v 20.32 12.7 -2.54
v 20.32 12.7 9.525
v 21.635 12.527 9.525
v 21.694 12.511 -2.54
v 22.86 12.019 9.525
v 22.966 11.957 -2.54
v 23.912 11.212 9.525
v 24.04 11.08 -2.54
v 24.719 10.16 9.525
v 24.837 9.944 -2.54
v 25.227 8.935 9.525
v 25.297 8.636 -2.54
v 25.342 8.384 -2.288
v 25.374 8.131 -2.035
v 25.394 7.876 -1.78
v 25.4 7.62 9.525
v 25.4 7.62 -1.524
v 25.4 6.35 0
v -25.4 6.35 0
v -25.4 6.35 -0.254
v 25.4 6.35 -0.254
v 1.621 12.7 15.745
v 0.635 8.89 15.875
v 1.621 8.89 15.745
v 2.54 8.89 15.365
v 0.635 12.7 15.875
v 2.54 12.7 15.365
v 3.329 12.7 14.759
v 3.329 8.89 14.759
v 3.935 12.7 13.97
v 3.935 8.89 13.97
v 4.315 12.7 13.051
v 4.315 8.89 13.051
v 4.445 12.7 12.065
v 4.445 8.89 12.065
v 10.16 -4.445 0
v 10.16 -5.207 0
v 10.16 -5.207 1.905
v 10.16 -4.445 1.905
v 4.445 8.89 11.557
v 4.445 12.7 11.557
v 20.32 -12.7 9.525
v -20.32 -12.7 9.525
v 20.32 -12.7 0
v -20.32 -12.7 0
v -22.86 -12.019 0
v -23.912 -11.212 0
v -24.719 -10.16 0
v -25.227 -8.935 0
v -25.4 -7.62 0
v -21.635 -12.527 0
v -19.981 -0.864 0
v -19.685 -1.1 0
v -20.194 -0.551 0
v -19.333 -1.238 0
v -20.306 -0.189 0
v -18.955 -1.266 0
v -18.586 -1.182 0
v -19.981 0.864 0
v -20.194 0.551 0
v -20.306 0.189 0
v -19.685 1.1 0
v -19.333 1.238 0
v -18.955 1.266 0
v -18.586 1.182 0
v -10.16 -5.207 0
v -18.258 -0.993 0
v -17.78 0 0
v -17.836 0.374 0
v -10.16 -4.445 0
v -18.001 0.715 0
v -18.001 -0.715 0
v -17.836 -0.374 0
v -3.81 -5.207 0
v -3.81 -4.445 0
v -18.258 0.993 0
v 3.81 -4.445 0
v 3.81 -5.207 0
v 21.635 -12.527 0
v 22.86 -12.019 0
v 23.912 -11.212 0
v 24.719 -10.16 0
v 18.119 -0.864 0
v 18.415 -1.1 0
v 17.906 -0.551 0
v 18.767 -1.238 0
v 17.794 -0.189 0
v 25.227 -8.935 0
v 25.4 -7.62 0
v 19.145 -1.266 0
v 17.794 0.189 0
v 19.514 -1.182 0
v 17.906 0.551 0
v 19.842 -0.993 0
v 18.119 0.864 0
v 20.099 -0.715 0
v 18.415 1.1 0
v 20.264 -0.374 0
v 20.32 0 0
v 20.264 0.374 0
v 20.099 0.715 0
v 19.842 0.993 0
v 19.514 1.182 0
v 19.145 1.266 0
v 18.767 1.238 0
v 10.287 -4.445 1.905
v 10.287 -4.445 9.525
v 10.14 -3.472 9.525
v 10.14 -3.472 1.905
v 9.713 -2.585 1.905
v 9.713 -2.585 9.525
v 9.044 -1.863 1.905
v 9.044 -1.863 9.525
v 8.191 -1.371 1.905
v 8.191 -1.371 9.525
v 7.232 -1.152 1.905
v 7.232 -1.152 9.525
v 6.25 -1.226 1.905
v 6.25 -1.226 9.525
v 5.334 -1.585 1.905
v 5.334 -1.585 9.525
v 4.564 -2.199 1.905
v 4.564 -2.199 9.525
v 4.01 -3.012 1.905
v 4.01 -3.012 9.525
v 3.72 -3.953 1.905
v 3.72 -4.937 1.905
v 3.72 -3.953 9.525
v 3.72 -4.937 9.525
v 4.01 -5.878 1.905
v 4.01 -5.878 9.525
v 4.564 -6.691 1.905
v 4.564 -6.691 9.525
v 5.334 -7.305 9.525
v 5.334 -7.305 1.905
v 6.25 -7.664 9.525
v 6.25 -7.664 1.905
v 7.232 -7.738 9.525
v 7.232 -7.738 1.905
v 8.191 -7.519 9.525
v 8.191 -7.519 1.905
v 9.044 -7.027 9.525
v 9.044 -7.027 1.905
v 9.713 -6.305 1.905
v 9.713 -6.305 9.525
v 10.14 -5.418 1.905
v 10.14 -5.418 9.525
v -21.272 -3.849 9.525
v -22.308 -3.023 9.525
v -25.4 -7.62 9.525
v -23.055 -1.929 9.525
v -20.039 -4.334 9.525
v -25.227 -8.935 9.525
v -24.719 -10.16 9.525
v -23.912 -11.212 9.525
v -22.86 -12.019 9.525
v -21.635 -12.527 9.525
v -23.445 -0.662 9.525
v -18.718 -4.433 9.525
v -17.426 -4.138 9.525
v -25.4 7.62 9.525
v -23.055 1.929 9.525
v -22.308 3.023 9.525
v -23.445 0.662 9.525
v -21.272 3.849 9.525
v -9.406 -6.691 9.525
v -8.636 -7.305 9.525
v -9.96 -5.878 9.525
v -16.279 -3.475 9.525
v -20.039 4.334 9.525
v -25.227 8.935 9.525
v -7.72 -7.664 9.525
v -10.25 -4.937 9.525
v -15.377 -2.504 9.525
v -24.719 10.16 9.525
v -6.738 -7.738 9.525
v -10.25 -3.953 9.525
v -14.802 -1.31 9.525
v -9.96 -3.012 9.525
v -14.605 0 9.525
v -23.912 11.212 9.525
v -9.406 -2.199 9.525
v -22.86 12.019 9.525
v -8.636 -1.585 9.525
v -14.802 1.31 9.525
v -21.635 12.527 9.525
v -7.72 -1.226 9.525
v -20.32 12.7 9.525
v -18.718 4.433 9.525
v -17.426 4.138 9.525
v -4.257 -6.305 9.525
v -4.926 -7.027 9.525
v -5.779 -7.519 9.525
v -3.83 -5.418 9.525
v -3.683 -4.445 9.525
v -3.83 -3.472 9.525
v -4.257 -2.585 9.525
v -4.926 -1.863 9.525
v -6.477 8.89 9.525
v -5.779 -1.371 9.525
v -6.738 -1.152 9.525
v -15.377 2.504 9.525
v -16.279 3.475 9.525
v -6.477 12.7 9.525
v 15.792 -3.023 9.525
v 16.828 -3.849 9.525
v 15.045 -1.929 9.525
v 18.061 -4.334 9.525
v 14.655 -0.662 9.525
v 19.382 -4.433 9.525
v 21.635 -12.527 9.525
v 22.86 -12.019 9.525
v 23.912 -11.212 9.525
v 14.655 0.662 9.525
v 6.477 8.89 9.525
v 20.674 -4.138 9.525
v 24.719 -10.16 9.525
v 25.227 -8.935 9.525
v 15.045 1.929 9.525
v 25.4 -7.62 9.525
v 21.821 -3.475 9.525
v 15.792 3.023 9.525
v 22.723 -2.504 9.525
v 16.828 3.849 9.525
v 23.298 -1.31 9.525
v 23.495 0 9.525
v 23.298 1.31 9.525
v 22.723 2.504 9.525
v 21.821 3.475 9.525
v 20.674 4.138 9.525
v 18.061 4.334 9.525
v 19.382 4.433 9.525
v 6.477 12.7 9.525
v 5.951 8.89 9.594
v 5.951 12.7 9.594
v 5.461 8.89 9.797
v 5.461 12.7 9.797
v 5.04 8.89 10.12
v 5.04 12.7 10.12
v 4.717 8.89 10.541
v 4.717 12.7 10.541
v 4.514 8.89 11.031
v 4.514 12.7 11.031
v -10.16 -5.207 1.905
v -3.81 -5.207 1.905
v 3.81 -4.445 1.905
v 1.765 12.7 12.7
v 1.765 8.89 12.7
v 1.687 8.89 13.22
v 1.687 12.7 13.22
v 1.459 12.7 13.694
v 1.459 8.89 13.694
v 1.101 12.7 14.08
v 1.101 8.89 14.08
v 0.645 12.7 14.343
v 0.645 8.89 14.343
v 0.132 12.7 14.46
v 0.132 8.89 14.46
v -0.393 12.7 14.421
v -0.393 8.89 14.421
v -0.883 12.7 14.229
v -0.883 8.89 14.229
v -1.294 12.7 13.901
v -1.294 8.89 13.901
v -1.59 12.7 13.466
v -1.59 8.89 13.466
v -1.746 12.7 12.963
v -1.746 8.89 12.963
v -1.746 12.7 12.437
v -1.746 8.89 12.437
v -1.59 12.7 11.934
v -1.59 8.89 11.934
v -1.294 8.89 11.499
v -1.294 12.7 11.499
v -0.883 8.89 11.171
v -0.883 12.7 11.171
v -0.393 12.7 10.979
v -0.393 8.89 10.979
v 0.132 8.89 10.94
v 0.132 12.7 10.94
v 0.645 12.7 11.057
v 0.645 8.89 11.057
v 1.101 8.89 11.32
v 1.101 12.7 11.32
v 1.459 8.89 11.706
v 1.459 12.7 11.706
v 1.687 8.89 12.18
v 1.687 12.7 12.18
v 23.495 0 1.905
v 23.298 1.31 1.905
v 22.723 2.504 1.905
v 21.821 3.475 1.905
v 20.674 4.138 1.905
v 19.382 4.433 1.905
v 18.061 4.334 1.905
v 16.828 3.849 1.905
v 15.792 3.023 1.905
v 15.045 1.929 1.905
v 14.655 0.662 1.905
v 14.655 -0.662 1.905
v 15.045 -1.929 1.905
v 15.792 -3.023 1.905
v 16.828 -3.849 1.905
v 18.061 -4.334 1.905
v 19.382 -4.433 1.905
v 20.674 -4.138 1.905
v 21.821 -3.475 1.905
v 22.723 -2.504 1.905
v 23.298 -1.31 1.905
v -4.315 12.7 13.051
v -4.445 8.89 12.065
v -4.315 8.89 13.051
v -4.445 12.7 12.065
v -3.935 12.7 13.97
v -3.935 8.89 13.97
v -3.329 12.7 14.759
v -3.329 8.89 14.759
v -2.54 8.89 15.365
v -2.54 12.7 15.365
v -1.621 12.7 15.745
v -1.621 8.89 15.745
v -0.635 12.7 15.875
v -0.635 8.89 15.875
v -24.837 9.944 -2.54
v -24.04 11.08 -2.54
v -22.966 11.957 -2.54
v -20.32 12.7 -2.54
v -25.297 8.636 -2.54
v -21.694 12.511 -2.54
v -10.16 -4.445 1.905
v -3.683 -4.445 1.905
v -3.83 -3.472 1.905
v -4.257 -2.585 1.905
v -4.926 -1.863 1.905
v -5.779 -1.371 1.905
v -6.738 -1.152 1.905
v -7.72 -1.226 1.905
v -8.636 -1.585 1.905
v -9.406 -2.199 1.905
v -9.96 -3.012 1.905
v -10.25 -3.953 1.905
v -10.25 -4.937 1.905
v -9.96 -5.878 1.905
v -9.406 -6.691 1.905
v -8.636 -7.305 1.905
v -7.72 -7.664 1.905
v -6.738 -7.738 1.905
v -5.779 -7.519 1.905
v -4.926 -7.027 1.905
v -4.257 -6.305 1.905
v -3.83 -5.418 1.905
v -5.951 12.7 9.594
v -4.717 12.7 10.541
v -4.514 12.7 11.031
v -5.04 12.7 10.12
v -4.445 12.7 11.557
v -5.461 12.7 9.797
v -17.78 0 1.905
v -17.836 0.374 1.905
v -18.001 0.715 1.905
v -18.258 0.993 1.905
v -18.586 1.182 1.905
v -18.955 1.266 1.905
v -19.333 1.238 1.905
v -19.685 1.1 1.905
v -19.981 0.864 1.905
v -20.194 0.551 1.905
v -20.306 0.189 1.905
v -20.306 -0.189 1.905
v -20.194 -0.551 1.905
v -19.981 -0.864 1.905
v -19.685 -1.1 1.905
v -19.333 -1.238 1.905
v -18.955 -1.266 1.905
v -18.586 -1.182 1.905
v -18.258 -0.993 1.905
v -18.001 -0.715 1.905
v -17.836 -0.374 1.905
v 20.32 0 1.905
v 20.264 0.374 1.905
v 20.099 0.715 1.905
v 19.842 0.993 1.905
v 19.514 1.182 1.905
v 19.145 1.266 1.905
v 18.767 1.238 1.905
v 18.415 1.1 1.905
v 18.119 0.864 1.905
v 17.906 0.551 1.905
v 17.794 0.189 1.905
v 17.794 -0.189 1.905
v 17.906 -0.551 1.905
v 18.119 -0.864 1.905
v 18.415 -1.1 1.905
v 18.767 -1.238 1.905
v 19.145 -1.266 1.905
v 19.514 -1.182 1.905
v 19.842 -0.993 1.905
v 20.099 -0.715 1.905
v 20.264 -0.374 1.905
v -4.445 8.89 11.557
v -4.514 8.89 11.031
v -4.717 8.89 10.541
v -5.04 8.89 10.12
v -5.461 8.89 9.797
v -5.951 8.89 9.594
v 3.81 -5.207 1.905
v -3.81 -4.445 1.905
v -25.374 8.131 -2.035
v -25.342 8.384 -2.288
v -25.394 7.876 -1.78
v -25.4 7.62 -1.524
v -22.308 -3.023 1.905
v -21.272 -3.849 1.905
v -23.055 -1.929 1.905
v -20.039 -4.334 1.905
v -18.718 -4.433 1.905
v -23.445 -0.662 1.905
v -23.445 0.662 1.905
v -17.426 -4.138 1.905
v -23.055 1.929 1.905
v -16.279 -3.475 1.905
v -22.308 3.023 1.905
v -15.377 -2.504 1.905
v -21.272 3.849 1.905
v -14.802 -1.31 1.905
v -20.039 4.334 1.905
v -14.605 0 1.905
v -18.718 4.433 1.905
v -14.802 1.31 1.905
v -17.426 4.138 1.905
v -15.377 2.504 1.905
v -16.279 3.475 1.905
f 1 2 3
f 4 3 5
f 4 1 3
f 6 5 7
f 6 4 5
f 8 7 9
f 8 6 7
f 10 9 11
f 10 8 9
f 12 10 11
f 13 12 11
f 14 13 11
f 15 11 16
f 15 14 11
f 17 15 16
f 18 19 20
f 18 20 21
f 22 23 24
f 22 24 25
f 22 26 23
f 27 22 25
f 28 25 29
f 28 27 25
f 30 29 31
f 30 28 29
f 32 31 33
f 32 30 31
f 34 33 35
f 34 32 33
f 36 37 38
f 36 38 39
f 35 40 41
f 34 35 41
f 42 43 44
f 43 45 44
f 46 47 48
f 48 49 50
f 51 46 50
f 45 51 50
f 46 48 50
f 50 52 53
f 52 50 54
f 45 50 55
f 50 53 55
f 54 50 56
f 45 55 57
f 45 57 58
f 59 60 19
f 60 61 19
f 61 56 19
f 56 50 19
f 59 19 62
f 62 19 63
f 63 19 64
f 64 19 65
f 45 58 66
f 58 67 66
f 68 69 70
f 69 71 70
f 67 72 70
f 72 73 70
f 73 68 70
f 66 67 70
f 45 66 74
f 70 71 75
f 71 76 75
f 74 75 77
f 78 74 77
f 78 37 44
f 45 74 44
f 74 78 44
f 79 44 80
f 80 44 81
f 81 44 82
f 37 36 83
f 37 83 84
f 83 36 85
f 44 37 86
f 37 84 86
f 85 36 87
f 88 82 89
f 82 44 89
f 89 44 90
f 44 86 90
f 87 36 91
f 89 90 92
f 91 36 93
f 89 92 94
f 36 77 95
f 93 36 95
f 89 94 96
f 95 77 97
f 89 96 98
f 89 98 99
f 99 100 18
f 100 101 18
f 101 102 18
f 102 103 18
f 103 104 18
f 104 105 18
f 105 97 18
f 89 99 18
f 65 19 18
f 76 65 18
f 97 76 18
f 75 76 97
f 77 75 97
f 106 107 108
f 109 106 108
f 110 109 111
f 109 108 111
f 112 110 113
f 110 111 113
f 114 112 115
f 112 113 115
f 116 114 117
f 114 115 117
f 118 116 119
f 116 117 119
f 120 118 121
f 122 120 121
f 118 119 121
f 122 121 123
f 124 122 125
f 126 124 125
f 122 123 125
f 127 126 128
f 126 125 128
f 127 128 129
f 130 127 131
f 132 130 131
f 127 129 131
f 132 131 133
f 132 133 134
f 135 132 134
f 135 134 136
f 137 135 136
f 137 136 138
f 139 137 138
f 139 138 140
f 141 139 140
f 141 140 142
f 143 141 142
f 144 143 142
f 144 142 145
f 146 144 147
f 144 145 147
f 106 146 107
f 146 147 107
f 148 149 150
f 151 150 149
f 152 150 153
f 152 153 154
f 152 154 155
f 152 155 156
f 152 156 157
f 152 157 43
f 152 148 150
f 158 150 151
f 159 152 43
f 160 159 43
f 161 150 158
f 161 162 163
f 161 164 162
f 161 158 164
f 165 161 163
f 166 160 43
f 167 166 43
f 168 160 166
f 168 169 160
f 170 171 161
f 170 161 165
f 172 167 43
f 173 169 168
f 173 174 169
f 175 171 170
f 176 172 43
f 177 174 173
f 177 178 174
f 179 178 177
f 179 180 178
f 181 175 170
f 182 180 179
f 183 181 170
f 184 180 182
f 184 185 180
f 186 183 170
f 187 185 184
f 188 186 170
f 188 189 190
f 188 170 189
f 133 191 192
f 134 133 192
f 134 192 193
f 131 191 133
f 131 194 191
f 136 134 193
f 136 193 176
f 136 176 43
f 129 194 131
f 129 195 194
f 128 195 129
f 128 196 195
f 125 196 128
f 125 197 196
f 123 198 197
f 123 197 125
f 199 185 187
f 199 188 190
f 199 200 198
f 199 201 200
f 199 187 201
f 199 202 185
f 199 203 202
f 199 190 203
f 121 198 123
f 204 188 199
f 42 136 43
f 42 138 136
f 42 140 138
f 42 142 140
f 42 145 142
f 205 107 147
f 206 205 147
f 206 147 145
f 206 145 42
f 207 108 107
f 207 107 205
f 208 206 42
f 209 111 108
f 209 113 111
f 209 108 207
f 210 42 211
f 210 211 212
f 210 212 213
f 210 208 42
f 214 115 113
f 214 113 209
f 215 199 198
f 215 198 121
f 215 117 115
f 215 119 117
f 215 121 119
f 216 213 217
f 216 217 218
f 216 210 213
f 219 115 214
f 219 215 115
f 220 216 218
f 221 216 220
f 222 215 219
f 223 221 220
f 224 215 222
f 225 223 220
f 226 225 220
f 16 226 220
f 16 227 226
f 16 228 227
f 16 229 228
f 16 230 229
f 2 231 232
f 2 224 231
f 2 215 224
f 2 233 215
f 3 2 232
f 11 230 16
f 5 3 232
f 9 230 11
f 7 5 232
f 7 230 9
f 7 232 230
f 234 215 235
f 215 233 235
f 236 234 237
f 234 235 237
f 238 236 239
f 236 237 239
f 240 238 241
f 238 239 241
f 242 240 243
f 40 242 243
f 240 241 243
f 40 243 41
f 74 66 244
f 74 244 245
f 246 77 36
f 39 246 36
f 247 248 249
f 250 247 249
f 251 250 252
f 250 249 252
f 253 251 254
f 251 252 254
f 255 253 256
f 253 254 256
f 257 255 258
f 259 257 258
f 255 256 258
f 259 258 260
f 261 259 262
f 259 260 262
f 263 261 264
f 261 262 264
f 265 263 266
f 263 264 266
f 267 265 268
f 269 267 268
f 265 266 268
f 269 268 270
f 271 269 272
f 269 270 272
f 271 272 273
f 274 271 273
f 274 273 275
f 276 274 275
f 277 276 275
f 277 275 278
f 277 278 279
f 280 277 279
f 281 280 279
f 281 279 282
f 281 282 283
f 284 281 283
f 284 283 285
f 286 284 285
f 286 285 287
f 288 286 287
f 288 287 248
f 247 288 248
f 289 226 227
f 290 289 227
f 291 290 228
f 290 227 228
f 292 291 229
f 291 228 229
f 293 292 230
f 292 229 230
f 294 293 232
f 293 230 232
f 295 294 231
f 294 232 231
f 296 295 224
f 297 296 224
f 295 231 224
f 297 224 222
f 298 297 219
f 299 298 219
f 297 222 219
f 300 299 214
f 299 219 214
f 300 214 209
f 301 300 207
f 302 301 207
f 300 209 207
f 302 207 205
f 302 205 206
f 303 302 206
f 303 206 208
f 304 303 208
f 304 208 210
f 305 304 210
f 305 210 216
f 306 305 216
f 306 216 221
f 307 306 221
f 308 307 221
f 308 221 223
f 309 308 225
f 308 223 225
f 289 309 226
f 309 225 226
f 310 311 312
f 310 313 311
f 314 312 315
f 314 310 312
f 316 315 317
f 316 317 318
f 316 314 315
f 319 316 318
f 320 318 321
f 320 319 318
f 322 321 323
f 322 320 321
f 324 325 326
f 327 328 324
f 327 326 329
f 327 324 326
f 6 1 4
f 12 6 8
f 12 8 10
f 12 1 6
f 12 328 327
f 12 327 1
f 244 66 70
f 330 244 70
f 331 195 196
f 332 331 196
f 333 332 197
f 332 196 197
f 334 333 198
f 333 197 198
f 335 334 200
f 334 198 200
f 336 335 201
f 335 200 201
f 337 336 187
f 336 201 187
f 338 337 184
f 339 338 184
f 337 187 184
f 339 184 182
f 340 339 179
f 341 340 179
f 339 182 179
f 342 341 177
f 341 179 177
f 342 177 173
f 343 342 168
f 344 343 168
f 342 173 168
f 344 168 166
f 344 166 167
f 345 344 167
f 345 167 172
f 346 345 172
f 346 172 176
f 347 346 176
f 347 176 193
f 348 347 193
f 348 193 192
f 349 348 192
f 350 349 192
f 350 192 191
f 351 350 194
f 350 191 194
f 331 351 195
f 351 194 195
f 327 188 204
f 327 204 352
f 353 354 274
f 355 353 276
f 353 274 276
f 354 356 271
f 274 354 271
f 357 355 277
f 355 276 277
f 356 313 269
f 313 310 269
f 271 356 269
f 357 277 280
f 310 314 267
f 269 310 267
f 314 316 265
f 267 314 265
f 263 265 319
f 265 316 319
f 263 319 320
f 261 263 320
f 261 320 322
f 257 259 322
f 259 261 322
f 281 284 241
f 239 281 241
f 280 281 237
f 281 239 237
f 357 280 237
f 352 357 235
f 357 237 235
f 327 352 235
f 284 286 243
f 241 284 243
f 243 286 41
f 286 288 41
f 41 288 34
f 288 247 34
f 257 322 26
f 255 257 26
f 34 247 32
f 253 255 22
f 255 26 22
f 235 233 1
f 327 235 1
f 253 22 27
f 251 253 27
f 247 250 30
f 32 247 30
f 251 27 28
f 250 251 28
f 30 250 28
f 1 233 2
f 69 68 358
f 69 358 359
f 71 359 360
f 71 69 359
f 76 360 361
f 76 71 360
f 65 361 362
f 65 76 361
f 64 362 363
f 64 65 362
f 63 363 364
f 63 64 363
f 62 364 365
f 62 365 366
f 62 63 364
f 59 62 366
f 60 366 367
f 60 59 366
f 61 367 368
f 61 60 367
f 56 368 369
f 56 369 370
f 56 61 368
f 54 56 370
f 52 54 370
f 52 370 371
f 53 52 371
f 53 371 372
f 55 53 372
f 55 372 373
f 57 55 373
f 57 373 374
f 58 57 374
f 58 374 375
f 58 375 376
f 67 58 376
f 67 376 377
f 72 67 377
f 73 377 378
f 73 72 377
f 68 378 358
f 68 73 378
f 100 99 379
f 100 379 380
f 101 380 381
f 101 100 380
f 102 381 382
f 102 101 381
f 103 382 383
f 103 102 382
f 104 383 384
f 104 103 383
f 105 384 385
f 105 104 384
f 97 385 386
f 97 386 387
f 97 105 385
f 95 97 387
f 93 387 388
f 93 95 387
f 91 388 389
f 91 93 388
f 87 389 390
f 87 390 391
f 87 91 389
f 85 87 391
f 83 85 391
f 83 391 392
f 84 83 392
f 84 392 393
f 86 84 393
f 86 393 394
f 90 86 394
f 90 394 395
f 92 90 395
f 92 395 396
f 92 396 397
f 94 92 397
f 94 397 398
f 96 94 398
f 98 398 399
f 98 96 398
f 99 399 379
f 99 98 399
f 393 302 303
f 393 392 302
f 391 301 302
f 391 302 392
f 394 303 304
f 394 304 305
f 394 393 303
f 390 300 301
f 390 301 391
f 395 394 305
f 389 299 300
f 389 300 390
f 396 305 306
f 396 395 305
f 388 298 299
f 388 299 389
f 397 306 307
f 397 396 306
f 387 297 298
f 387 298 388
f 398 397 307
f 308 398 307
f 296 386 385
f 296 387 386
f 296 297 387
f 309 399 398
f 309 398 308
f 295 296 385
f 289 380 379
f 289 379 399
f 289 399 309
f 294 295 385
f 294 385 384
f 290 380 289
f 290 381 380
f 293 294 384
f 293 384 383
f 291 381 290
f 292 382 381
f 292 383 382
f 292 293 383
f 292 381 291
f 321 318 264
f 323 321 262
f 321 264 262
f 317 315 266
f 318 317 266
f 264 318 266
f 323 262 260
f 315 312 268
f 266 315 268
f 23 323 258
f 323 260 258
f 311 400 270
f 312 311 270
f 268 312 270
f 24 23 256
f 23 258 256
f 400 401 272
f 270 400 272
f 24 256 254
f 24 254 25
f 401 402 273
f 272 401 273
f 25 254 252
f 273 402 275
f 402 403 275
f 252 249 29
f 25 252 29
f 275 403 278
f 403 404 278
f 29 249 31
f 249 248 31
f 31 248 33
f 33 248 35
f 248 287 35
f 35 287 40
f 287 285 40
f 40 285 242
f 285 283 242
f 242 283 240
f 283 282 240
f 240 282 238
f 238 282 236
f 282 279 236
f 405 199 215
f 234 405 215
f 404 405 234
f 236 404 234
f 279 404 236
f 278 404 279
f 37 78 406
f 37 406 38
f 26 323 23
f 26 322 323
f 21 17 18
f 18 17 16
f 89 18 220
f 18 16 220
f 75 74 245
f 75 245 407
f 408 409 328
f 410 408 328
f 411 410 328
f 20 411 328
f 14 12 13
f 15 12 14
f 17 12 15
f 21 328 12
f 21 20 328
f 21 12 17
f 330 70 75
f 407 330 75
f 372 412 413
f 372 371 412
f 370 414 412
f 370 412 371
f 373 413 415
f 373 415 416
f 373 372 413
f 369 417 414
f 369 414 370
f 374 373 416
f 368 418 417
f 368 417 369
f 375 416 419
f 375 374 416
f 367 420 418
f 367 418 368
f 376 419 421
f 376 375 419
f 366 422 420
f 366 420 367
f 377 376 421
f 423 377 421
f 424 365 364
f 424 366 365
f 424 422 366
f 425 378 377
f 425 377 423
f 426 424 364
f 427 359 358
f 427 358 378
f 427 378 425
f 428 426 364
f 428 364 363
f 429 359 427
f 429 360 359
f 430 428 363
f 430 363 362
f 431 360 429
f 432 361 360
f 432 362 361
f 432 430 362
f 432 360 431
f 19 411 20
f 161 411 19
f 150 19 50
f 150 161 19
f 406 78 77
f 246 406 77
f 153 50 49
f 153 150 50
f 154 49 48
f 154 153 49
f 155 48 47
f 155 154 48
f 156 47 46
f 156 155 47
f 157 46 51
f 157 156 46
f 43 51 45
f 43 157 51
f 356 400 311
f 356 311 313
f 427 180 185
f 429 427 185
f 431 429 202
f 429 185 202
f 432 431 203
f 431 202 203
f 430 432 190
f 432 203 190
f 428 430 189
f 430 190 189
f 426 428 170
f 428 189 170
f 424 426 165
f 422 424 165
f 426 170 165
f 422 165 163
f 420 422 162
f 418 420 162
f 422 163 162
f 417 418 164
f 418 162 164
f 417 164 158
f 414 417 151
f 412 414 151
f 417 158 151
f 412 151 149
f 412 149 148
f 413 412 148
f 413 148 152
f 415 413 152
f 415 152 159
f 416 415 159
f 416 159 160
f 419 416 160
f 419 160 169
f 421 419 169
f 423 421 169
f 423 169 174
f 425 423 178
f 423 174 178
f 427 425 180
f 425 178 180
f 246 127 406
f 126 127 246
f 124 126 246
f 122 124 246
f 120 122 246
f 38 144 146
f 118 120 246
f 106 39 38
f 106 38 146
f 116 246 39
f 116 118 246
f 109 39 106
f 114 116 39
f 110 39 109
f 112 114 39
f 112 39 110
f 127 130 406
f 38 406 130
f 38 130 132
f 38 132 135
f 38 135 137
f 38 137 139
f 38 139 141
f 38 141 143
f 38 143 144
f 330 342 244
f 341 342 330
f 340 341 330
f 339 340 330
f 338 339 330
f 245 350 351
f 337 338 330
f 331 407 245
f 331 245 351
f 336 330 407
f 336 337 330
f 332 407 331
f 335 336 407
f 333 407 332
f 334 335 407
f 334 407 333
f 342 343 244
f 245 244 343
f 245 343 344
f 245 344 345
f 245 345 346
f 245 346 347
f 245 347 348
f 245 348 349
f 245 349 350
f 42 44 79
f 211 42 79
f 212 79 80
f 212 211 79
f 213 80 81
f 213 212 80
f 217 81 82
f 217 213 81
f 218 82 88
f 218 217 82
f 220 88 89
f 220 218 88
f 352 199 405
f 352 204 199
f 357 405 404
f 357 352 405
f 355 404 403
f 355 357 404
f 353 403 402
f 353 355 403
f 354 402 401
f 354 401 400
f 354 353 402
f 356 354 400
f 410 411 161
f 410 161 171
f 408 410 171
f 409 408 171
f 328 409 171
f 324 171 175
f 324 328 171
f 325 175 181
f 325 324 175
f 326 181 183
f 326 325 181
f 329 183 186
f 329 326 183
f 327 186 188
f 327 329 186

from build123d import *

# Parameters (mm, degrees)
SKETCH_W        = 50.8
SKETCH_H        = 25.4
SKETCH_R        = 1.27
SKETCH_W_2      = 6.35
SKETCH_H_2      = 0.762
PAD_DEPTH       = 1.905
SKETCH001_W     = 50.8
SKETCH001_H     = 25.4
PAD001_DEPTH    = 7.62
SKETCH002_R     = 3.302
SKETCH002_R_2   = 4.445
POCKET_DEPTH    = 7.62
SKETCH003_W     = 50.8
SKETCH003_H     = 6.35
PAD002_DEPTH    = 2.54
SKETCH004_W     = 8.89
SKETCH004_H     = 3.81
PAD003_DEPTH    = 6.35
SKETCH005_R     = 1.7653
POCKET001_DEPTH = 5.08
FILLET_R        = 5.08
FILLET001_R     = 2.032
FILLET002_R     = 3.81
CHAMFER_SIZE    = 2.286


with BuildPart() as part:
    # Sketch → Pad (new body)
    with BuildSketch(Plane.XY):
        Rectangle(SKETCH_W, SKETCH_H)
        with Locations((-19.05, 0)):
            Circle(SKETCH_R, mode=Mode.SUBTRACT)
        with Locations((19.05, 0)):
            Circle(SKETCH_R, mode=Mode.SUBTRACT)
        with Locations((6.985, -4.826)):
            Rectangle(SKETCH_W_2, SKETCH_H_2, mode=Mode.SUBTRACT)
        with Locations((-6.985, -4.826)):
            Rectangle(SKETCH_W_2, SKETCH_H_2, mode=Mode.SUBTRACT)
    extrude(amount=PAD_DEPTH)

    # Sketch001 (on Face16 of Pad) → Pad001 (join)
    with BuildSketch(Plane.XY.offset(1.905)):
        Rectangle(SKETCH001_W, SKETCH001_H)
    extrude(amount=PAD001_DEPTH)

    # Sketch002 (on Face17 of Pad001) → Pocket (cut)
    with BuildSketch(Plane.XY.offset(9.525)):
        with Locations((-6.985, -4.445)):
            Circle(SKETCH002_R)
        with Locations((6.985, -4.445)):
            Circle(SKETCH002_R)
        with Locations((19.05, 0)):
            Circle(SKETCH002_R_2)
        with Locations((-19.05, 0)):
            Circle(SKETCH002_R_2)
    extrude(amount=-POCKET_DEPTH, mode=Mode.SUBTRACT)

    # Sketch003 (on Face1 of Pocket) → Pad002 (join)
    with BuildSketch(Plane(origin=(0, 0, 0), x_dir=(1, 0, 0), z_dir=(0, 0, -1))):
        with Locations((0, -9.525)):
            Rectangle(SKETCH003_W, SKETCH003_H)
    extrude(amount=PAD002_DEPTH)

    # Sketch004 (on Face15 of Pad002) → Pad003 (join)
    with BuildSketch(Plane.XY.offset(9.525)):
        with Locations((0, 10.795)):
            Rectangle(SKETCH004_W, SKETCH004_H)
    extrude(amount=PAD003_DEPTH)

    # Sketch005 (on Face23 of Pad003) → Pocket001 (cut)
    with BuildSketch(Plane.XZ.offset(-8.89)):
        with Locations((0, 12.7)):
            Circle(SKETCH005_R)
    extrude(amount=-POCKET001_DEPTH, mode=Mode.SUBTRACT)

    # Fillet
    fillet_edges = [part.edges().sort_by_distance(p)[0] for p in [
        (25.4, 12.7, 3.4925),
        (-25.4, 12.7, 3.4925),
        (25.4, -12.7, 4.7625),
        (-25.4, -12.7, 4.7625),
    ]]
    fillet(fillet_edges, radius=FILLET_R)

    # Fillet001
    fillet001_edges = [part.edges().sort_by_distance(p)[0] for p in [
        (4.445, 10.795, 9.525),
        (-4.445, 10.795, 9.525),
    ]]
    fillet(fillet001_edges, radius=FILLET001_R)

    # Fillet002
    fillet002_edges = [part.edges().sort_by_distance(p)[0] for p in [
        (-4.445, 10.795, 15.875),
        (4.445, 10.795, 15.875),
    ]]
    fillet(fillet002_edges, radius=FILLET002_R)

    # Chamfer
    chamfer_edges = [part.edges().sort_by_distance(p)[0] for p in [
        (0, 6.35, -2.54),
    ]]
    chamfer(chamfer_edges, length=CHAMFER_SIZE)


solid = part.part
